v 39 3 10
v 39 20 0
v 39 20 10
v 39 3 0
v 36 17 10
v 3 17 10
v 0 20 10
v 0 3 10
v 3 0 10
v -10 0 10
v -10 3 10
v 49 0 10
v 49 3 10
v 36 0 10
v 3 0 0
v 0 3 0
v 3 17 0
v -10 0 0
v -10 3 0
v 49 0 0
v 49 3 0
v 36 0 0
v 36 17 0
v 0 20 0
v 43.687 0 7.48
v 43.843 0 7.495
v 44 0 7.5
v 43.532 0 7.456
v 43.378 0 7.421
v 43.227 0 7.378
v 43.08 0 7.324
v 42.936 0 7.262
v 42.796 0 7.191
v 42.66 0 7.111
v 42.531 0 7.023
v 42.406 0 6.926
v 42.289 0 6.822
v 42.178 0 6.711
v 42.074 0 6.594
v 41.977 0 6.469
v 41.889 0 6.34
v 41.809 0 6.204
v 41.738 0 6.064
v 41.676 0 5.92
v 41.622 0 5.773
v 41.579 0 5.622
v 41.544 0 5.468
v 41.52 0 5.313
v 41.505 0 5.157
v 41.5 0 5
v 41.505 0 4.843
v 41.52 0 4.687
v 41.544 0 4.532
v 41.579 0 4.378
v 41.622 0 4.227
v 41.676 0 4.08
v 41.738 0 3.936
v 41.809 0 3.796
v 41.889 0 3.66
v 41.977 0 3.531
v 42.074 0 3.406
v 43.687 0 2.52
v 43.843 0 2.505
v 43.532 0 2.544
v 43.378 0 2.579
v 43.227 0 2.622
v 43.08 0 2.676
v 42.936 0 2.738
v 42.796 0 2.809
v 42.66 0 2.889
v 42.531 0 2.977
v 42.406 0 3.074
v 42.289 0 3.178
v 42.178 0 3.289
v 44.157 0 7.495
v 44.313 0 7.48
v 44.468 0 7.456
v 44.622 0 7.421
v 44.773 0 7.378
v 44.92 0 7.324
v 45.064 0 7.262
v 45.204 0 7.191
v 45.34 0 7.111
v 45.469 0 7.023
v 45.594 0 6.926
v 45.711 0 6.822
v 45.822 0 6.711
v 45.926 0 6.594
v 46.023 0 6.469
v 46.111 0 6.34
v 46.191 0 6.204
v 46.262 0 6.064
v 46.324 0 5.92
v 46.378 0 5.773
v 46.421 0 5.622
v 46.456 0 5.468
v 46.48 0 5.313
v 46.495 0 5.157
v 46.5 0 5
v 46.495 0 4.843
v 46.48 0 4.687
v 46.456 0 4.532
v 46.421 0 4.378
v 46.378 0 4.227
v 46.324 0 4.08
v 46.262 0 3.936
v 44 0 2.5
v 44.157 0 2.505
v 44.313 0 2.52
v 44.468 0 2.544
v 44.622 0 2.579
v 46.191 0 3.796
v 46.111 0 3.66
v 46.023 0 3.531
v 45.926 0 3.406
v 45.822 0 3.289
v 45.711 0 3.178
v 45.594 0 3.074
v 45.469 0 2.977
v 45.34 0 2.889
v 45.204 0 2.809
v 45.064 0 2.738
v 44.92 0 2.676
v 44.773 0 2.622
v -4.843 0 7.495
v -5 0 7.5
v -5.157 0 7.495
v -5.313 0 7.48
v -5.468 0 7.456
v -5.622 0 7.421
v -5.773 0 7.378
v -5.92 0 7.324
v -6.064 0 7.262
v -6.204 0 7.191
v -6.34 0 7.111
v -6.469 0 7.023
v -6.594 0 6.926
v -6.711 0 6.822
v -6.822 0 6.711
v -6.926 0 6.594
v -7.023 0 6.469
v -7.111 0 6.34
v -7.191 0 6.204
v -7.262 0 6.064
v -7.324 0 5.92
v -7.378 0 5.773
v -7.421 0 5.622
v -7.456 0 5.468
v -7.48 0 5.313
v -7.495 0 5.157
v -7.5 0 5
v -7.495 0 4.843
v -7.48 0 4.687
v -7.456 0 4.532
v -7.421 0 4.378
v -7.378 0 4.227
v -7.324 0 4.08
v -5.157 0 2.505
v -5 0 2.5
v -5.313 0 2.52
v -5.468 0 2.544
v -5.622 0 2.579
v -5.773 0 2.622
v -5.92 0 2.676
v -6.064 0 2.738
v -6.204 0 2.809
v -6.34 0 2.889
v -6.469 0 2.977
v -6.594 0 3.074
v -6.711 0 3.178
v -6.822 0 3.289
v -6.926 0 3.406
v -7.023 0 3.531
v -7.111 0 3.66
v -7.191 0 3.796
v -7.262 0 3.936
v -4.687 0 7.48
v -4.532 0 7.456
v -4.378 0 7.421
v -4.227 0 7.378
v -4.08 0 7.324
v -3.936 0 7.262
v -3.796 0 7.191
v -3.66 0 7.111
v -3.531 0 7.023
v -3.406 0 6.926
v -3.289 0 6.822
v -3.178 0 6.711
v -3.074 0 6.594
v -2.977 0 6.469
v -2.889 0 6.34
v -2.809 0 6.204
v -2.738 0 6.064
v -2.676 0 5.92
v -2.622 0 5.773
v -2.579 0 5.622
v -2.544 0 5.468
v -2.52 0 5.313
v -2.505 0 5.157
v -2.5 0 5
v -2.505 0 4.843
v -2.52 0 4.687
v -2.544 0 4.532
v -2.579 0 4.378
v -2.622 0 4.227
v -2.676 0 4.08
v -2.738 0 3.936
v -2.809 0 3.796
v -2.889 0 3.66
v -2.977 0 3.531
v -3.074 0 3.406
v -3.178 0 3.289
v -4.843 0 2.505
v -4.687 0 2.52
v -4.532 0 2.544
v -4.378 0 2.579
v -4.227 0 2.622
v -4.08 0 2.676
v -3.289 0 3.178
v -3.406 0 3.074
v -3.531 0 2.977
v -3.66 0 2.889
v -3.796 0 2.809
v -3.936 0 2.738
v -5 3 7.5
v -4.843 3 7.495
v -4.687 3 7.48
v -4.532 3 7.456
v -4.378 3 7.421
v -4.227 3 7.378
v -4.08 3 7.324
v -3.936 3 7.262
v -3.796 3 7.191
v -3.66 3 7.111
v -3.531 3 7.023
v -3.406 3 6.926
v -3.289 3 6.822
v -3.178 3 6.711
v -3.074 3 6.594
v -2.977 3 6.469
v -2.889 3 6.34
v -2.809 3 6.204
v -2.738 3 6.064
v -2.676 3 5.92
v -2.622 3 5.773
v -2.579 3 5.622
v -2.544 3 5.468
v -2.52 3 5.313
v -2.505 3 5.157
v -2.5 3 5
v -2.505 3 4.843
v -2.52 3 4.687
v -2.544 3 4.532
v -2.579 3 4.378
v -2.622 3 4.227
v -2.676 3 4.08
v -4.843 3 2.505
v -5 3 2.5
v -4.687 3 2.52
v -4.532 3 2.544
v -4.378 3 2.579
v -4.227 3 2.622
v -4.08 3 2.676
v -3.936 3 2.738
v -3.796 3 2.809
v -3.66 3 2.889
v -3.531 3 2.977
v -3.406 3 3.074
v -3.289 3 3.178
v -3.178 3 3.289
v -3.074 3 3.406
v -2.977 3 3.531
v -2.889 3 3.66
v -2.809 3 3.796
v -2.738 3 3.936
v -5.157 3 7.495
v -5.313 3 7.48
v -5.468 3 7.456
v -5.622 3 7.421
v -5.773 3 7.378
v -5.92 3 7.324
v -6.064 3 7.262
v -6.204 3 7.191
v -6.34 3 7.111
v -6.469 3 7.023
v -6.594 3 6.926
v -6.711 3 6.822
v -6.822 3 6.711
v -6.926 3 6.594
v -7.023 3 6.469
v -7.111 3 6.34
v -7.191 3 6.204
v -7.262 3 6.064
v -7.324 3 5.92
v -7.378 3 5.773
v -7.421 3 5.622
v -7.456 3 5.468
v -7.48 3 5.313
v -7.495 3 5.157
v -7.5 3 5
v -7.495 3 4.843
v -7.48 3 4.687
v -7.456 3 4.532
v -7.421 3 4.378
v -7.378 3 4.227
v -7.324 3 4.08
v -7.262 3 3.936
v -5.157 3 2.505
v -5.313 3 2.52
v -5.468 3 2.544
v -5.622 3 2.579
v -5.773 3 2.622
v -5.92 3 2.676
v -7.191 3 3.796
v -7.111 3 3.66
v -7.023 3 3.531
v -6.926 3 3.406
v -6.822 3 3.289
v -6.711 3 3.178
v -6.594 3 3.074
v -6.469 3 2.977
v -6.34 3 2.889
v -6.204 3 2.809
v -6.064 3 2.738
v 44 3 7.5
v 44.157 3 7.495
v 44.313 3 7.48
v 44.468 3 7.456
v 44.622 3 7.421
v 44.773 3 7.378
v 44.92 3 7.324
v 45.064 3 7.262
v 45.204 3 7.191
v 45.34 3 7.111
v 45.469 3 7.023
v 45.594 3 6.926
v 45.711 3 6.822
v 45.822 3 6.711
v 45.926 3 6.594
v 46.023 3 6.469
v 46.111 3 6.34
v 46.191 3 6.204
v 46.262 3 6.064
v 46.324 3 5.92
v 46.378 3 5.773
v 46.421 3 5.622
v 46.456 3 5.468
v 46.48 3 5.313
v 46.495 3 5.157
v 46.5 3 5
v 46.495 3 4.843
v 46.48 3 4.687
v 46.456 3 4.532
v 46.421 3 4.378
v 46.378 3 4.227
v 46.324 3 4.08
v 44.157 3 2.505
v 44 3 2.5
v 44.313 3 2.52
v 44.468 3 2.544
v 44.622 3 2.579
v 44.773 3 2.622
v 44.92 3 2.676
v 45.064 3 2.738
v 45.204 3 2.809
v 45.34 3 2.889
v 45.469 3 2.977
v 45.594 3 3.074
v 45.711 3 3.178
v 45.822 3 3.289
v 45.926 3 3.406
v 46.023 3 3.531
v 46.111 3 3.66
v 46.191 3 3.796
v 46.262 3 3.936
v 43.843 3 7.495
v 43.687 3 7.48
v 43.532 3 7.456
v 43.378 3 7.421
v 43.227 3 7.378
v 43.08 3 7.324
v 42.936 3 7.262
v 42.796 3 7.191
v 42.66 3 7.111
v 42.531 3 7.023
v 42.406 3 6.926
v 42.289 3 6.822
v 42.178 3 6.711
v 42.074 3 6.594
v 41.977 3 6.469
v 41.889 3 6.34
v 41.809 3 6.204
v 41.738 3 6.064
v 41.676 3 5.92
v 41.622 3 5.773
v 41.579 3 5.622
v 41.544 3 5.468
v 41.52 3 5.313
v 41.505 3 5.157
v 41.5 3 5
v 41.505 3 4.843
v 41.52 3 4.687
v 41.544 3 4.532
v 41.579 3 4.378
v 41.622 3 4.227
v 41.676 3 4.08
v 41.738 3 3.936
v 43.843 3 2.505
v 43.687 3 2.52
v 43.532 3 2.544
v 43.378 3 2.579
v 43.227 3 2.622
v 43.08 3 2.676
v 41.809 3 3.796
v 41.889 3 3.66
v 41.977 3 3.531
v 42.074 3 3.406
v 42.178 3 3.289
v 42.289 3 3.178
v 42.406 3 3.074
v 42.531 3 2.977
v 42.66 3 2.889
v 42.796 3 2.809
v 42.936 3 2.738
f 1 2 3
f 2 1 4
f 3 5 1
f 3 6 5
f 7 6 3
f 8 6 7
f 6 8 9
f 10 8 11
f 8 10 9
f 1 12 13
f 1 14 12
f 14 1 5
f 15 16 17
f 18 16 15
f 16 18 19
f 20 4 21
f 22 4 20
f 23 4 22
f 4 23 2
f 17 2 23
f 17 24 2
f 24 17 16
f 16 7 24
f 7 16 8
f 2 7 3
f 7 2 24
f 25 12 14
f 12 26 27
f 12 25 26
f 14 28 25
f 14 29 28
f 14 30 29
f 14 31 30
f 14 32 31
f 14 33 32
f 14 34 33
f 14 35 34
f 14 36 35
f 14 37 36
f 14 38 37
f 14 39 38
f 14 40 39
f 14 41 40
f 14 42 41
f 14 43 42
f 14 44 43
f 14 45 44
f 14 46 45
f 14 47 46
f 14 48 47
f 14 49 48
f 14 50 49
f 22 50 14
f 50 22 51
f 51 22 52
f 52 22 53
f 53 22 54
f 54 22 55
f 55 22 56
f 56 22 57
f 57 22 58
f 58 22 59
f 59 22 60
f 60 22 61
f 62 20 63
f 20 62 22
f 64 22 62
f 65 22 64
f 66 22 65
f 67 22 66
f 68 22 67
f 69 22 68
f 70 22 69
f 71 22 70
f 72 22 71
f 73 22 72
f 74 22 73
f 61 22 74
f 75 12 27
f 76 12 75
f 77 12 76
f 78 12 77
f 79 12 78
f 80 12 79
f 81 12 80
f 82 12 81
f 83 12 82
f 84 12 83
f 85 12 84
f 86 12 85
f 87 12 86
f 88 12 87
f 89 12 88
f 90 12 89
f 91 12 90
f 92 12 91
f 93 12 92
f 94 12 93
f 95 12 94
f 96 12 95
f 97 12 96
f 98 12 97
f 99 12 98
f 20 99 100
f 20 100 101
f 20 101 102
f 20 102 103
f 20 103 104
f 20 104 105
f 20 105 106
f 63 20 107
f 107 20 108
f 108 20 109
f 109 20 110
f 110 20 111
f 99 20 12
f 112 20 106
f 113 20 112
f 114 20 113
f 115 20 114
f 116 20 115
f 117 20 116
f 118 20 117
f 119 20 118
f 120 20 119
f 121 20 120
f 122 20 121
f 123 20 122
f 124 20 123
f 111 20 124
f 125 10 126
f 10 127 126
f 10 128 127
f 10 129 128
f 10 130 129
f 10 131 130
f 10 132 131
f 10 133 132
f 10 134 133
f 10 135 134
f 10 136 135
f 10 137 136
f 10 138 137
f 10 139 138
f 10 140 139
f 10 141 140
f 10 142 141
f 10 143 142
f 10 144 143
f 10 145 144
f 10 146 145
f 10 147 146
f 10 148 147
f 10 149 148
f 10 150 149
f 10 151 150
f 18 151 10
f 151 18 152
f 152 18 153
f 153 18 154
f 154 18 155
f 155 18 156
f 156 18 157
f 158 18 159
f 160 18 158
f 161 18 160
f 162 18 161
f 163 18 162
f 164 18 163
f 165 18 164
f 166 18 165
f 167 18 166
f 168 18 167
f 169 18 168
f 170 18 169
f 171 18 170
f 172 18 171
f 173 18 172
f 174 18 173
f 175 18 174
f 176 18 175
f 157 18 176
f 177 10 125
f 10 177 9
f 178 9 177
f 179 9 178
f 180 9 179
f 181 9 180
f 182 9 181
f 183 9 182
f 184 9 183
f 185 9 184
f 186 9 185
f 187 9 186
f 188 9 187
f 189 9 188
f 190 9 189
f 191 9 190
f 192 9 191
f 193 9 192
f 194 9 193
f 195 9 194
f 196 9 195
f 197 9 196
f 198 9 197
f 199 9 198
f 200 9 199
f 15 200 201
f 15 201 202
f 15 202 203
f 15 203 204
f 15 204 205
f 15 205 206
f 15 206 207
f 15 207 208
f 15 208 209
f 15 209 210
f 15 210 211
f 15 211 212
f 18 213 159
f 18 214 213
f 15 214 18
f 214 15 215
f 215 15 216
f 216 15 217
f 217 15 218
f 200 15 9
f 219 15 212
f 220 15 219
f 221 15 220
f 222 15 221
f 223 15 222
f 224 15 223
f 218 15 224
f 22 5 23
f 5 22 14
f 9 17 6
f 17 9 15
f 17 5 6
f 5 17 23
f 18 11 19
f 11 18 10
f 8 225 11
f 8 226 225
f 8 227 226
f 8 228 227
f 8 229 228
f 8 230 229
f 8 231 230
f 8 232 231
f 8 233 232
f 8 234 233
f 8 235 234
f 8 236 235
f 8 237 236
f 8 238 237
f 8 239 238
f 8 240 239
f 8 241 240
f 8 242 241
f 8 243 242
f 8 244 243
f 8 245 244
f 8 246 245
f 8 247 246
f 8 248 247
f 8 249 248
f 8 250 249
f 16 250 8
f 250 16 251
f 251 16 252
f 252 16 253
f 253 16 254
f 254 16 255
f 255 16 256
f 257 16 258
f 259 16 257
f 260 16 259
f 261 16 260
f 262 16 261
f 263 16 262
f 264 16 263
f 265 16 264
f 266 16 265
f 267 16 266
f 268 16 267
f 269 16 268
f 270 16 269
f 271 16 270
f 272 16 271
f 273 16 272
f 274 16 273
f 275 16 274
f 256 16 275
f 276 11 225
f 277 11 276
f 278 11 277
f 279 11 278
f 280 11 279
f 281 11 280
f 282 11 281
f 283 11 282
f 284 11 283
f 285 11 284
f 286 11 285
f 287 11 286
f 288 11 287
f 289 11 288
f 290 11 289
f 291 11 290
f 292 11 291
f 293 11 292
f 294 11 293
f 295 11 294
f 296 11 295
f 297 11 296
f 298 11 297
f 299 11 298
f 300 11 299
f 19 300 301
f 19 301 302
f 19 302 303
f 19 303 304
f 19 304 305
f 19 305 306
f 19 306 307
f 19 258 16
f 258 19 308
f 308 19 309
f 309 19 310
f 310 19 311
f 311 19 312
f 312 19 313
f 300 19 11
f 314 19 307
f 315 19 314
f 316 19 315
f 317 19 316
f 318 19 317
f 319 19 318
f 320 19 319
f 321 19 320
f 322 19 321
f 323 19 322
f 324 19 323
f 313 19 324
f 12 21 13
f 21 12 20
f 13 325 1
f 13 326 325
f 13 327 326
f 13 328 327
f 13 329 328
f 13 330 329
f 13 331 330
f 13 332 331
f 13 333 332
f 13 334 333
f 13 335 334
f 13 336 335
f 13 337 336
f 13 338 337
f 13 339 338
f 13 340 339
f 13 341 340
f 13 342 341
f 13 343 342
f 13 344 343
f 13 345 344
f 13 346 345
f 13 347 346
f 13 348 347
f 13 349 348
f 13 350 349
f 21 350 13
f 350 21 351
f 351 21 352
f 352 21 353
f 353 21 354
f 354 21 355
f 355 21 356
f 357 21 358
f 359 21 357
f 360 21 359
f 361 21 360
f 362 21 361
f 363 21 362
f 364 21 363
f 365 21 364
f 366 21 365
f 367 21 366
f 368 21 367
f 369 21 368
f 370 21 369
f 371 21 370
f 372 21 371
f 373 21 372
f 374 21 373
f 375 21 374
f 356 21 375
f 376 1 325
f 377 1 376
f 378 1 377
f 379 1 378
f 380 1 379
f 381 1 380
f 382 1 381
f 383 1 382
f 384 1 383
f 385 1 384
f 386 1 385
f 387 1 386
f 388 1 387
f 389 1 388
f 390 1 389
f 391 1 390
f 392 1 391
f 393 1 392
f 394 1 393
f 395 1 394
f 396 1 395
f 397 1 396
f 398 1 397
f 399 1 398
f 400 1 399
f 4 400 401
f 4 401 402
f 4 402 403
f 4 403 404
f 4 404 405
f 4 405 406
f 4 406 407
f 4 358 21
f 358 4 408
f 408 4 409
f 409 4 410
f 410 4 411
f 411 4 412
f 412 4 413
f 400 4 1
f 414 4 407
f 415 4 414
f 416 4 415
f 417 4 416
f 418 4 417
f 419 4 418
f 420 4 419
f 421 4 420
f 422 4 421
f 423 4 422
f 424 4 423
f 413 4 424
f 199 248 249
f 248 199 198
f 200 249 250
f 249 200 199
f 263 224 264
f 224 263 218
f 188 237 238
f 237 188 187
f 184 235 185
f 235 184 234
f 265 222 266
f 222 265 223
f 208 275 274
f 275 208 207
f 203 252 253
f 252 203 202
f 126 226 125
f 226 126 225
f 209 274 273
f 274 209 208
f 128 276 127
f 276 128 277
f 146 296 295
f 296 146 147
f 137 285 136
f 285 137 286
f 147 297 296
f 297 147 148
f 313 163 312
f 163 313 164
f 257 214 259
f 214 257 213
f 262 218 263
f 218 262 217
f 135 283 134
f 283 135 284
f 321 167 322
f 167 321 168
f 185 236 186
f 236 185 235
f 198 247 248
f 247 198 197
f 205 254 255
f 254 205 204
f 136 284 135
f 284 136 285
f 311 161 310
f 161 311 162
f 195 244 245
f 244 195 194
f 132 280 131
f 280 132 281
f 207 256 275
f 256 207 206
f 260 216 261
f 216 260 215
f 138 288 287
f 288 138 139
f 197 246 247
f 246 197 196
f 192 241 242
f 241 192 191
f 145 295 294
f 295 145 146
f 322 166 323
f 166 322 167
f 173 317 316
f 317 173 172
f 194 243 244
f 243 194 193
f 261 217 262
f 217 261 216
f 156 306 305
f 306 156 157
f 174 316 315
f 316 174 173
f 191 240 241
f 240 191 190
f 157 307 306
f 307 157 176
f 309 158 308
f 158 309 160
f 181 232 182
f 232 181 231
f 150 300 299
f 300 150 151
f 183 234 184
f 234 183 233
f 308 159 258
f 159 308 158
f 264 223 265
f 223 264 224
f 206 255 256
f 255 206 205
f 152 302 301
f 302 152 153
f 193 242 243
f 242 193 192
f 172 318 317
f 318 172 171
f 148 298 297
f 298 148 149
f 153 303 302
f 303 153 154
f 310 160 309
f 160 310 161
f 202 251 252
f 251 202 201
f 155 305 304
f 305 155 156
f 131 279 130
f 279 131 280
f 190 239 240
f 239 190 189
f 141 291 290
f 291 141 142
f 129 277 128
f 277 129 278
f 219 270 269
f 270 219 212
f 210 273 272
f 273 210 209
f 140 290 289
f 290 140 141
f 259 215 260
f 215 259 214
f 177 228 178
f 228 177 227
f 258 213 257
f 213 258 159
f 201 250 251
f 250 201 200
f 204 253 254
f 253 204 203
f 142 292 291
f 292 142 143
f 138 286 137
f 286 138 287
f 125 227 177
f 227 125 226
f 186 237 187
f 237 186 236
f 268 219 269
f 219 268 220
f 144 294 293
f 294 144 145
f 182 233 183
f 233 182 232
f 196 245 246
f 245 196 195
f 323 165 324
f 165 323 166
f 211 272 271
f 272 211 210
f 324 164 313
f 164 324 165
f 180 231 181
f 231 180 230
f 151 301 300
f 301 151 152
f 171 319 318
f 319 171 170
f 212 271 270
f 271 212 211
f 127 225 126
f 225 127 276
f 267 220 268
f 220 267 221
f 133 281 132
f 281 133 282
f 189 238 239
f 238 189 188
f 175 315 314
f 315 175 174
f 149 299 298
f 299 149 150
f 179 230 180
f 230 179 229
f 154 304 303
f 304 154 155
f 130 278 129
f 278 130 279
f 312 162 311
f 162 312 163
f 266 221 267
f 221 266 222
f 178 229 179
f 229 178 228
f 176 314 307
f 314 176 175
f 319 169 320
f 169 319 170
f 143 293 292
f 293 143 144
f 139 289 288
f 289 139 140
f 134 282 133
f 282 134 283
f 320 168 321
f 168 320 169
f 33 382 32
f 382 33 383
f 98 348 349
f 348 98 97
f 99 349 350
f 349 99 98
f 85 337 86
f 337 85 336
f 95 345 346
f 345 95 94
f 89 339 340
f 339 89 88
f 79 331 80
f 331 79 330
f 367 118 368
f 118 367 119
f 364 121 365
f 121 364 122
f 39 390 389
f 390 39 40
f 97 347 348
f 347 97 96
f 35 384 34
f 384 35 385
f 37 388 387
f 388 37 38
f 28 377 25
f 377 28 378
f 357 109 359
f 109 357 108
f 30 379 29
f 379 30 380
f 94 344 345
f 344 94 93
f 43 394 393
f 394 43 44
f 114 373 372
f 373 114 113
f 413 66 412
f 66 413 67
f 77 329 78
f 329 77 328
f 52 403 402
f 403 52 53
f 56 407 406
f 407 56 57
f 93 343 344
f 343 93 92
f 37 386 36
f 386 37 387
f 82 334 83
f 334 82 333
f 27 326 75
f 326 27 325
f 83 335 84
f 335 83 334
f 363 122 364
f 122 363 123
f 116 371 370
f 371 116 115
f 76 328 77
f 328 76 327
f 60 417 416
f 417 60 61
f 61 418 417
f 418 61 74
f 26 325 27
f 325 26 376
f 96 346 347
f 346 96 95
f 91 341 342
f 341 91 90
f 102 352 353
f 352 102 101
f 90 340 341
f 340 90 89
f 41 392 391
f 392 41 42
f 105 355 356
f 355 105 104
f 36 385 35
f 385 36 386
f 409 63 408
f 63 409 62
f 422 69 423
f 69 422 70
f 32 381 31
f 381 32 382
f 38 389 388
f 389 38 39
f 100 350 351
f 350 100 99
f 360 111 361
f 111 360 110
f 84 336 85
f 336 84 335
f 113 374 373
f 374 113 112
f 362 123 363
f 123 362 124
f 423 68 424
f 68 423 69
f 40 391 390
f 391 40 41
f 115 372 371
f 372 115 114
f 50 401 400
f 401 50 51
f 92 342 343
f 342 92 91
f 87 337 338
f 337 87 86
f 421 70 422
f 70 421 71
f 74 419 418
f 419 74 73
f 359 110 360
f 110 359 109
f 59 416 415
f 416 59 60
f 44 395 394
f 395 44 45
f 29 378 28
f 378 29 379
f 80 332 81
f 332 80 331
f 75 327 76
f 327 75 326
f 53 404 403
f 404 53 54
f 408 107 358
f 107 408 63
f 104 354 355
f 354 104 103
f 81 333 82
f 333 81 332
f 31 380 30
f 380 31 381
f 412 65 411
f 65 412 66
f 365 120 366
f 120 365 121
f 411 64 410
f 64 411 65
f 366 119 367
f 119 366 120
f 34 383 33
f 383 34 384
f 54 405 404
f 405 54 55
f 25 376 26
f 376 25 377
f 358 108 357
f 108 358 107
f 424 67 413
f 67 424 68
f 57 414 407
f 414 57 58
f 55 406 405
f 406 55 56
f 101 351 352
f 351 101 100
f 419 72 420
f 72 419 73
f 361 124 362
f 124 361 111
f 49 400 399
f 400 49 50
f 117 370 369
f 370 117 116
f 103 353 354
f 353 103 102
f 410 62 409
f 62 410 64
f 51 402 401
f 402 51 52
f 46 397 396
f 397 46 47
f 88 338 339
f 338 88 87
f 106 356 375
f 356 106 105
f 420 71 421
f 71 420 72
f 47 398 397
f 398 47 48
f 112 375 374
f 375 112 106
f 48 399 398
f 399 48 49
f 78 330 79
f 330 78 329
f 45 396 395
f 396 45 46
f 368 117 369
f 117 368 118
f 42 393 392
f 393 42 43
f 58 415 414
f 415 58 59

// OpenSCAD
// Halterung Keyston Modul

$fn=100;

difference() {
union(){
    difference(){
        cube ([39,20,10]);
        translate([3,0,0]) cube([33,17,11]);
    }
    translate([-10,0,0]) cube([10,3,10]);
    translate([39,0,0]) cube([10,3,10]);
    
}
//rotate([90,0,0]) translate([-5,5,0]) cylinder(h=10,d=6);
rotate([90,0,0]) translate([-5,5,-4]) cylinder(h=10,d=5);
rotate([90,0,0]) translate([44,5,-4]) cylinder(h=10,d=5);
}
